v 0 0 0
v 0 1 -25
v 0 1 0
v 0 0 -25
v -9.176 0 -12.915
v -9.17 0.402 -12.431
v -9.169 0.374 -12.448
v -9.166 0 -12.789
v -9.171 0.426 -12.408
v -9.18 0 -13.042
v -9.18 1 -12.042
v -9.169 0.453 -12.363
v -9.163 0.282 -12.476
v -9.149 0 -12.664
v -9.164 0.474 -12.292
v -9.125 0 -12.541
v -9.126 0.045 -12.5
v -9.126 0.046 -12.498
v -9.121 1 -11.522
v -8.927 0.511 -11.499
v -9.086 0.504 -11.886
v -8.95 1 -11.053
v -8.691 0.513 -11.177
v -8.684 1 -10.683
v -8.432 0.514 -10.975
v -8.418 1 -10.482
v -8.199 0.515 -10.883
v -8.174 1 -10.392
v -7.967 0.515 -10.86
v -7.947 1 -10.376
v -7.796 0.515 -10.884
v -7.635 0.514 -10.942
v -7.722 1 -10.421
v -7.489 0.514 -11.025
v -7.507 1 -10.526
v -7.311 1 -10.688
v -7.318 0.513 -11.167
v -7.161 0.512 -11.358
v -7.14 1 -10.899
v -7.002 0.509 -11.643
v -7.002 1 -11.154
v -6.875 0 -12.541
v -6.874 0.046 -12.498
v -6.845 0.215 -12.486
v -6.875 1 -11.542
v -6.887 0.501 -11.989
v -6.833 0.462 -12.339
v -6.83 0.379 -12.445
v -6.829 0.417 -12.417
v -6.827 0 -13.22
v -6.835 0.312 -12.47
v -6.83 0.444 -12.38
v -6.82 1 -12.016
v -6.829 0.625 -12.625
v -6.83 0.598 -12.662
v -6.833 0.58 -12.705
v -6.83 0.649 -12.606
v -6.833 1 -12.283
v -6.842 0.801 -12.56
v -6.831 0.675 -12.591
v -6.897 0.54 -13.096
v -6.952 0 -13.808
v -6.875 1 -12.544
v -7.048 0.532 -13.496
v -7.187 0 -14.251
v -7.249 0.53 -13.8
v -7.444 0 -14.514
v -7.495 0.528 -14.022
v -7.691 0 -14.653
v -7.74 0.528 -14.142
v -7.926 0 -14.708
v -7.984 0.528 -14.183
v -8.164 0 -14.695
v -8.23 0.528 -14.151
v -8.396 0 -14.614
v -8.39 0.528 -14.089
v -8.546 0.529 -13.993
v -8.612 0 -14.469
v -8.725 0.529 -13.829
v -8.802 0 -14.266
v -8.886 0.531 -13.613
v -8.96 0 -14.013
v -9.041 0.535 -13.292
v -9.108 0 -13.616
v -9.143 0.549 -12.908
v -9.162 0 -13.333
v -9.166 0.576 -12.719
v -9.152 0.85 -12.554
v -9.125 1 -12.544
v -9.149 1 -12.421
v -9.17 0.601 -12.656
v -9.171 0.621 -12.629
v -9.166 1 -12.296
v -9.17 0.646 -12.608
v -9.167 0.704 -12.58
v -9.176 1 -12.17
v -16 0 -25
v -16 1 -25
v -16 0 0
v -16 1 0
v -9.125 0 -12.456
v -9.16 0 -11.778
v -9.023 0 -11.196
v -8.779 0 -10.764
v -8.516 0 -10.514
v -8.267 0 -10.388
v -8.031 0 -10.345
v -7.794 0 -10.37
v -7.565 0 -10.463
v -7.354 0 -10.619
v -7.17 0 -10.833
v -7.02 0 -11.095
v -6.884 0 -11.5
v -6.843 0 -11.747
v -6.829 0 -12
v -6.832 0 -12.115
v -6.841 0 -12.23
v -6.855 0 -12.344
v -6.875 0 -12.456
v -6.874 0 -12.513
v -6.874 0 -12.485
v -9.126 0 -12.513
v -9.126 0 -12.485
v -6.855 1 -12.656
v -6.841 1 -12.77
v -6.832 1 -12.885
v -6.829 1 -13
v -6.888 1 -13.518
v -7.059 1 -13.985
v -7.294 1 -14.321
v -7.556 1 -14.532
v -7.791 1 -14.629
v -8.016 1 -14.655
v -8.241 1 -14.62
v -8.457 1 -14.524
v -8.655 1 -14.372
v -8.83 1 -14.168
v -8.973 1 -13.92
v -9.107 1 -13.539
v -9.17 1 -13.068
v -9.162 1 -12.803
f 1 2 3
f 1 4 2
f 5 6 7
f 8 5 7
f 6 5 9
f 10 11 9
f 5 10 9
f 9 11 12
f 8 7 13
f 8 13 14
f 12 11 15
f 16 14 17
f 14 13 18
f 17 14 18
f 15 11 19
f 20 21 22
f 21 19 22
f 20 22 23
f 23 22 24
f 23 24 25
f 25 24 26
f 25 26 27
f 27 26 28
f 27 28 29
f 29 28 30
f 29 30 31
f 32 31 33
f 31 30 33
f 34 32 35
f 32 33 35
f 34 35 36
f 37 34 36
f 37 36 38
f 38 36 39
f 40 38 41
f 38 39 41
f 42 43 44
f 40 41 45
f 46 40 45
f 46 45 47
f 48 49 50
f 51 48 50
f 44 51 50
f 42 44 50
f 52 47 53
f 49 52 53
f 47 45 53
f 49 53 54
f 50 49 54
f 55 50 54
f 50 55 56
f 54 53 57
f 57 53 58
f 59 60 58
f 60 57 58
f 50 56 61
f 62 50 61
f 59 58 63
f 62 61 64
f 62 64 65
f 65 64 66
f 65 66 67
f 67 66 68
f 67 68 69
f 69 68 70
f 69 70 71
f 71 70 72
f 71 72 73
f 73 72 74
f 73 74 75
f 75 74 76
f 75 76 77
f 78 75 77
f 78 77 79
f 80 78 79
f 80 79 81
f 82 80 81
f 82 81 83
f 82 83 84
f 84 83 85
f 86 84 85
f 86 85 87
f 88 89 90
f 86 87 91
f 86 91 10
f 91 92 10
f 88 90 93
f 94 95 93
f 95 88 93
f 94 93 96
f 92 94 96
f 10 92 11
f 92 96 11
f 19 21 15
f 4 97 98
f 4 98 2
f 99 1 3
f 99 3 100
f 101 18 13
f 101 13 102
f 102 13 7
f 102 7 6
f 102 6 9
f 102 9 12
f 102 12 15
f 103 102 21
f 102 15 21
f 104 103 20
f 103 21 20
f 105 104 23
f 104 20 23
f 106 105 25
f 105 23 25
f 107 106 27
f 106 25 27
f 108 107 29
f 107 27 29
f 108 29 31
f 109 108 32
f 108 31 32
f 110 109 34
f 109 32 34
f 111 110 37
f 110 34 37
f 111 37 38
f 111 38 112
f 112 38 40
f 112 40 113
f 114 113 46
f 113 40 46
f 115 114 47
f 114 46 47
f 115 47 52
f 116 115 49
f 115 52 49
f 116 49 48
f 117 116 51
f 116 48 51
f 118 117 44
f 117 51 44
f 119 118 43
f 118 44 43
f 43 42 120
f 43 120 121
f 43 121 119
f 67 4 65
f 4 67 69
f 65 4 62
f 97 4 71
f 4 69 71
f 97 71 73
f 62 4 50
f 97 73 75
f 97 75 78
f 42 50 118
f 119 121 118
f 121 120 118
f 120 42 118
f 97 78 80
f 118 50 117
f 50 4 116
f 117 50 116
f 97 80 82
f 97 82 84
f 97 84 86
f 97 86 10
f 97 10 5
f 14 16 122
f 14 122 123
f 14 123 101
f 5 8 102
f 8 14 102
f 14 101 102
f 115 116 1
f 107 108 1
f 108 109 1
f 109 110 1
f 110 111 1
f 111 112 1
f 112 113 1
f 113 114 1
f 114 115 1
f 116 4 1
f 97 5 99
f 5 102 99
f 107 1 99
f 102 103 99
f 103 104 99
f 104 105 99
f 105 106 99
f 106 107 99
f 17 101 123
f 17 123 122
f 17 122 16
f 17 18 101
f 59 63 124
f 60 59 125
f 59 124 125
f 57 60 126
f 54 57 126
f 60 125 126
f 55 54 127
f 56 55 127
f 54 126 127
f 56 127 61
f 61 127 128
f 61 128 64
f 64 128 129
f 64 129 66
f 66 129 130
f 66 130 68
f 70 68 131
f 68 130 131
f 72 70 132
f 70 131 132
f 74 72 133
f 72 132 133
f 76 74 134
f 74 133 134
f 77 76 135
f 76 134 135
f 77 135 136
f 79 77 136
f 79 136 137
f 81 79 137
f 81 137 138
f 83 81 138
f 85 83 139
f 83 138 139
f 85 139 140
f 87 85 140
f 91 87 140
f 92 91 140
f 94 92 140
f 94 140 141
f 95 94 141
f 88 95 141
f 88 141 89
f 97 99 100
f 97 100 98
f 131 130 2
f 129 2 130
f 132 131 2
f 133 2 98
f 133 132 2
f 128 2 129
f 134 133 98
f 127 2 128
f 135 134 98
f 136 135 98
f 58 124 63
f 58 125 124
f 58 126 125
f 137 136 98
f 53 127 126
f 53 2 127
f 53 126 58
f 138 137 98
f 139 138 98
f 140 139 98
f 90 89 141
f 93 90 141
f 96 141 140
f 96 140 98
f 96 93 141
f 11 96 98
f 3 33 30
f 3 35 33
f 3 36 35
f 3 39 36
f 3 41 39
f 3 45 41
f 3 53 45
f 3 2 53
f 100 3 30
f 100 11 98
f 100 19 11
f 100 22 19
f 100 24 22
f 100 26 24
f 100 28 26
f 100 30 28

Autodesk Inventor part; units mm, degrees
ref_plane "YZ Plane" through (0, 0, 0) normal (1, 0, 0) x (0, 1, 0)
ref_plane "XZ Plane" through (0, 0, 0) normal (0, 1, 0) x (-1, 0, 0)
ref_plane "XY Plane" through (0, 0, 0) normal (0, 0, 1) x (1, 0, 0)
sketch "Sketch1" plane through (0, 0, 0) normal (0, 1, 0) x (-1, 0, 0)
  line L0 (0, 0) -> (16, 0)
  line L1 (16, 0) -> (16, -25)
  line L2 (16, -25) -> (0, -25)
  line L3 (0, -25) -> (0, 0)
  circle A0 centre (8, -12.5) radius 1.1261
  dimension "d0" = 16
  dimension "d1" = 25
extrude "Extrusion1" add sketch "Sketch1" along normal blind 1
ref_plane "Work Plane1" through (16.9, 36.305, -11.9513) normal (0, 0.7071, 0.7071) x (-1, 0, 0)
sketch "Sketch2" plane through (16.9, 36.305, -11.9513) normal (0, 0.7071, 0.7071) x (-1, 0, 0)
  ellipse E0 centre (24.9, 24.5764) end of major axis (23.7739, 24.5764) minor radius 0.7963 projected
  circle A0 centre (24.9, 24.9) radius 1.1798
  ellipse E1 centre (24.9, 25.2835) end of major axis (23.7739, 25.2835) minor radius 0.7963 projected
  point P0 (16.9, 34.1223)
  dimension "d4" = 0.3236
extrude "Extrusion2" cut sketch "Sketch2" against normal through all contours E0 E1 A0 | E0 A0 E1 | E1 A0 E0 | E0 E1 | E0 A0 | E1 A0 E0 picked at (24.9476, 23.7672)
ref_plane "Work Plane2" through (0, 1, -25) normal (0, 0.7071, -0.7071) x (1, 0, 0)
sketch "Sketch3" plane through (0, 1, -25) normal (0, 0.7071, -0.7071) x (1, 0, 0)
  arc A0 (-7.287, -8.2225) -> (-8.713, -8.2225) centre (-8, -9.1624) ccw projected
  ellipse E0 centre (-8, -8.8388) end of major axis (-6.8739, -8.8388) minor radius 0.7963 (-6.8748, -8.8079) -> (-7.287, -8.2225) ccw projected
  arc A1 (-9.1252, -8.8079) -> (-6.8748, -8.8079) centre (-8, -9.1624) ccw projected
  ellipse E1 centre (-8, -8.8388) end of major axis (-6.8739, -8.8388) minor radius 0.7963 (-8.713, -8.2225) -> (-9.1252, -8.8079) ccw projected
  line L0 (-16, -17.6777) -> (0, -17.6777) projected
  line L1 (0, -17.6777) -> (0, 0) projected
  line L2 (0, 0) -> (-16, 0) projected
  line L3 (-16, 0) -> (-16, -17.6777) projected
  line L4 (0, 0.7071) -> (0, -16.9706) construction
  line L5 (-16, 0) -> (-16, -17.6777) construction
  line L6 (-16, -17.6777) -> (0, -17.6777) construction
  line L7 (-16, -17.6777) -> (0, -17.6777) construction
  arc A2 (-9.1252, -8.8079) -> (-6.8748, -8.8079) centre (-8, -9.1624) ccw construction
  arc A3 (-7.287, -8.2225) -> (-8.713, -8.2225) centre (-8, -9.1624) ccw construction
  arc A4 (-6.8747, -8.1025) -> (-9.1253, -8.1025) centre (-8, -7.7482) ccw construction
  line L8 (-16, 0.7071) -> (0, 0.7071) projected
  line L9 (0, 0.7071) -> (-16, -17.6777)
  line L10 (0, -17.6777) -> (0, 0) projected
  line L11 (0, -17.6777) -> (-16, 0.7071)
  circle A5 centre (-8, -8.4853) radius 1.1706
  point P0 (-8, -8.928)
extrude "Extrusion3" cut sketch "Sketch3" against normal blind 25.4 contours E0 A5 L11 L9 A0 | A0 L9 A5 E0 | L9 L11 A0 | A0 L11 A5 L9 | L11 L9 A5 E1 A0 | A0 E1 A5 L11 | L11 A5 L9
properties part number "00_Comar_Dichroic_16x25x0.2"
